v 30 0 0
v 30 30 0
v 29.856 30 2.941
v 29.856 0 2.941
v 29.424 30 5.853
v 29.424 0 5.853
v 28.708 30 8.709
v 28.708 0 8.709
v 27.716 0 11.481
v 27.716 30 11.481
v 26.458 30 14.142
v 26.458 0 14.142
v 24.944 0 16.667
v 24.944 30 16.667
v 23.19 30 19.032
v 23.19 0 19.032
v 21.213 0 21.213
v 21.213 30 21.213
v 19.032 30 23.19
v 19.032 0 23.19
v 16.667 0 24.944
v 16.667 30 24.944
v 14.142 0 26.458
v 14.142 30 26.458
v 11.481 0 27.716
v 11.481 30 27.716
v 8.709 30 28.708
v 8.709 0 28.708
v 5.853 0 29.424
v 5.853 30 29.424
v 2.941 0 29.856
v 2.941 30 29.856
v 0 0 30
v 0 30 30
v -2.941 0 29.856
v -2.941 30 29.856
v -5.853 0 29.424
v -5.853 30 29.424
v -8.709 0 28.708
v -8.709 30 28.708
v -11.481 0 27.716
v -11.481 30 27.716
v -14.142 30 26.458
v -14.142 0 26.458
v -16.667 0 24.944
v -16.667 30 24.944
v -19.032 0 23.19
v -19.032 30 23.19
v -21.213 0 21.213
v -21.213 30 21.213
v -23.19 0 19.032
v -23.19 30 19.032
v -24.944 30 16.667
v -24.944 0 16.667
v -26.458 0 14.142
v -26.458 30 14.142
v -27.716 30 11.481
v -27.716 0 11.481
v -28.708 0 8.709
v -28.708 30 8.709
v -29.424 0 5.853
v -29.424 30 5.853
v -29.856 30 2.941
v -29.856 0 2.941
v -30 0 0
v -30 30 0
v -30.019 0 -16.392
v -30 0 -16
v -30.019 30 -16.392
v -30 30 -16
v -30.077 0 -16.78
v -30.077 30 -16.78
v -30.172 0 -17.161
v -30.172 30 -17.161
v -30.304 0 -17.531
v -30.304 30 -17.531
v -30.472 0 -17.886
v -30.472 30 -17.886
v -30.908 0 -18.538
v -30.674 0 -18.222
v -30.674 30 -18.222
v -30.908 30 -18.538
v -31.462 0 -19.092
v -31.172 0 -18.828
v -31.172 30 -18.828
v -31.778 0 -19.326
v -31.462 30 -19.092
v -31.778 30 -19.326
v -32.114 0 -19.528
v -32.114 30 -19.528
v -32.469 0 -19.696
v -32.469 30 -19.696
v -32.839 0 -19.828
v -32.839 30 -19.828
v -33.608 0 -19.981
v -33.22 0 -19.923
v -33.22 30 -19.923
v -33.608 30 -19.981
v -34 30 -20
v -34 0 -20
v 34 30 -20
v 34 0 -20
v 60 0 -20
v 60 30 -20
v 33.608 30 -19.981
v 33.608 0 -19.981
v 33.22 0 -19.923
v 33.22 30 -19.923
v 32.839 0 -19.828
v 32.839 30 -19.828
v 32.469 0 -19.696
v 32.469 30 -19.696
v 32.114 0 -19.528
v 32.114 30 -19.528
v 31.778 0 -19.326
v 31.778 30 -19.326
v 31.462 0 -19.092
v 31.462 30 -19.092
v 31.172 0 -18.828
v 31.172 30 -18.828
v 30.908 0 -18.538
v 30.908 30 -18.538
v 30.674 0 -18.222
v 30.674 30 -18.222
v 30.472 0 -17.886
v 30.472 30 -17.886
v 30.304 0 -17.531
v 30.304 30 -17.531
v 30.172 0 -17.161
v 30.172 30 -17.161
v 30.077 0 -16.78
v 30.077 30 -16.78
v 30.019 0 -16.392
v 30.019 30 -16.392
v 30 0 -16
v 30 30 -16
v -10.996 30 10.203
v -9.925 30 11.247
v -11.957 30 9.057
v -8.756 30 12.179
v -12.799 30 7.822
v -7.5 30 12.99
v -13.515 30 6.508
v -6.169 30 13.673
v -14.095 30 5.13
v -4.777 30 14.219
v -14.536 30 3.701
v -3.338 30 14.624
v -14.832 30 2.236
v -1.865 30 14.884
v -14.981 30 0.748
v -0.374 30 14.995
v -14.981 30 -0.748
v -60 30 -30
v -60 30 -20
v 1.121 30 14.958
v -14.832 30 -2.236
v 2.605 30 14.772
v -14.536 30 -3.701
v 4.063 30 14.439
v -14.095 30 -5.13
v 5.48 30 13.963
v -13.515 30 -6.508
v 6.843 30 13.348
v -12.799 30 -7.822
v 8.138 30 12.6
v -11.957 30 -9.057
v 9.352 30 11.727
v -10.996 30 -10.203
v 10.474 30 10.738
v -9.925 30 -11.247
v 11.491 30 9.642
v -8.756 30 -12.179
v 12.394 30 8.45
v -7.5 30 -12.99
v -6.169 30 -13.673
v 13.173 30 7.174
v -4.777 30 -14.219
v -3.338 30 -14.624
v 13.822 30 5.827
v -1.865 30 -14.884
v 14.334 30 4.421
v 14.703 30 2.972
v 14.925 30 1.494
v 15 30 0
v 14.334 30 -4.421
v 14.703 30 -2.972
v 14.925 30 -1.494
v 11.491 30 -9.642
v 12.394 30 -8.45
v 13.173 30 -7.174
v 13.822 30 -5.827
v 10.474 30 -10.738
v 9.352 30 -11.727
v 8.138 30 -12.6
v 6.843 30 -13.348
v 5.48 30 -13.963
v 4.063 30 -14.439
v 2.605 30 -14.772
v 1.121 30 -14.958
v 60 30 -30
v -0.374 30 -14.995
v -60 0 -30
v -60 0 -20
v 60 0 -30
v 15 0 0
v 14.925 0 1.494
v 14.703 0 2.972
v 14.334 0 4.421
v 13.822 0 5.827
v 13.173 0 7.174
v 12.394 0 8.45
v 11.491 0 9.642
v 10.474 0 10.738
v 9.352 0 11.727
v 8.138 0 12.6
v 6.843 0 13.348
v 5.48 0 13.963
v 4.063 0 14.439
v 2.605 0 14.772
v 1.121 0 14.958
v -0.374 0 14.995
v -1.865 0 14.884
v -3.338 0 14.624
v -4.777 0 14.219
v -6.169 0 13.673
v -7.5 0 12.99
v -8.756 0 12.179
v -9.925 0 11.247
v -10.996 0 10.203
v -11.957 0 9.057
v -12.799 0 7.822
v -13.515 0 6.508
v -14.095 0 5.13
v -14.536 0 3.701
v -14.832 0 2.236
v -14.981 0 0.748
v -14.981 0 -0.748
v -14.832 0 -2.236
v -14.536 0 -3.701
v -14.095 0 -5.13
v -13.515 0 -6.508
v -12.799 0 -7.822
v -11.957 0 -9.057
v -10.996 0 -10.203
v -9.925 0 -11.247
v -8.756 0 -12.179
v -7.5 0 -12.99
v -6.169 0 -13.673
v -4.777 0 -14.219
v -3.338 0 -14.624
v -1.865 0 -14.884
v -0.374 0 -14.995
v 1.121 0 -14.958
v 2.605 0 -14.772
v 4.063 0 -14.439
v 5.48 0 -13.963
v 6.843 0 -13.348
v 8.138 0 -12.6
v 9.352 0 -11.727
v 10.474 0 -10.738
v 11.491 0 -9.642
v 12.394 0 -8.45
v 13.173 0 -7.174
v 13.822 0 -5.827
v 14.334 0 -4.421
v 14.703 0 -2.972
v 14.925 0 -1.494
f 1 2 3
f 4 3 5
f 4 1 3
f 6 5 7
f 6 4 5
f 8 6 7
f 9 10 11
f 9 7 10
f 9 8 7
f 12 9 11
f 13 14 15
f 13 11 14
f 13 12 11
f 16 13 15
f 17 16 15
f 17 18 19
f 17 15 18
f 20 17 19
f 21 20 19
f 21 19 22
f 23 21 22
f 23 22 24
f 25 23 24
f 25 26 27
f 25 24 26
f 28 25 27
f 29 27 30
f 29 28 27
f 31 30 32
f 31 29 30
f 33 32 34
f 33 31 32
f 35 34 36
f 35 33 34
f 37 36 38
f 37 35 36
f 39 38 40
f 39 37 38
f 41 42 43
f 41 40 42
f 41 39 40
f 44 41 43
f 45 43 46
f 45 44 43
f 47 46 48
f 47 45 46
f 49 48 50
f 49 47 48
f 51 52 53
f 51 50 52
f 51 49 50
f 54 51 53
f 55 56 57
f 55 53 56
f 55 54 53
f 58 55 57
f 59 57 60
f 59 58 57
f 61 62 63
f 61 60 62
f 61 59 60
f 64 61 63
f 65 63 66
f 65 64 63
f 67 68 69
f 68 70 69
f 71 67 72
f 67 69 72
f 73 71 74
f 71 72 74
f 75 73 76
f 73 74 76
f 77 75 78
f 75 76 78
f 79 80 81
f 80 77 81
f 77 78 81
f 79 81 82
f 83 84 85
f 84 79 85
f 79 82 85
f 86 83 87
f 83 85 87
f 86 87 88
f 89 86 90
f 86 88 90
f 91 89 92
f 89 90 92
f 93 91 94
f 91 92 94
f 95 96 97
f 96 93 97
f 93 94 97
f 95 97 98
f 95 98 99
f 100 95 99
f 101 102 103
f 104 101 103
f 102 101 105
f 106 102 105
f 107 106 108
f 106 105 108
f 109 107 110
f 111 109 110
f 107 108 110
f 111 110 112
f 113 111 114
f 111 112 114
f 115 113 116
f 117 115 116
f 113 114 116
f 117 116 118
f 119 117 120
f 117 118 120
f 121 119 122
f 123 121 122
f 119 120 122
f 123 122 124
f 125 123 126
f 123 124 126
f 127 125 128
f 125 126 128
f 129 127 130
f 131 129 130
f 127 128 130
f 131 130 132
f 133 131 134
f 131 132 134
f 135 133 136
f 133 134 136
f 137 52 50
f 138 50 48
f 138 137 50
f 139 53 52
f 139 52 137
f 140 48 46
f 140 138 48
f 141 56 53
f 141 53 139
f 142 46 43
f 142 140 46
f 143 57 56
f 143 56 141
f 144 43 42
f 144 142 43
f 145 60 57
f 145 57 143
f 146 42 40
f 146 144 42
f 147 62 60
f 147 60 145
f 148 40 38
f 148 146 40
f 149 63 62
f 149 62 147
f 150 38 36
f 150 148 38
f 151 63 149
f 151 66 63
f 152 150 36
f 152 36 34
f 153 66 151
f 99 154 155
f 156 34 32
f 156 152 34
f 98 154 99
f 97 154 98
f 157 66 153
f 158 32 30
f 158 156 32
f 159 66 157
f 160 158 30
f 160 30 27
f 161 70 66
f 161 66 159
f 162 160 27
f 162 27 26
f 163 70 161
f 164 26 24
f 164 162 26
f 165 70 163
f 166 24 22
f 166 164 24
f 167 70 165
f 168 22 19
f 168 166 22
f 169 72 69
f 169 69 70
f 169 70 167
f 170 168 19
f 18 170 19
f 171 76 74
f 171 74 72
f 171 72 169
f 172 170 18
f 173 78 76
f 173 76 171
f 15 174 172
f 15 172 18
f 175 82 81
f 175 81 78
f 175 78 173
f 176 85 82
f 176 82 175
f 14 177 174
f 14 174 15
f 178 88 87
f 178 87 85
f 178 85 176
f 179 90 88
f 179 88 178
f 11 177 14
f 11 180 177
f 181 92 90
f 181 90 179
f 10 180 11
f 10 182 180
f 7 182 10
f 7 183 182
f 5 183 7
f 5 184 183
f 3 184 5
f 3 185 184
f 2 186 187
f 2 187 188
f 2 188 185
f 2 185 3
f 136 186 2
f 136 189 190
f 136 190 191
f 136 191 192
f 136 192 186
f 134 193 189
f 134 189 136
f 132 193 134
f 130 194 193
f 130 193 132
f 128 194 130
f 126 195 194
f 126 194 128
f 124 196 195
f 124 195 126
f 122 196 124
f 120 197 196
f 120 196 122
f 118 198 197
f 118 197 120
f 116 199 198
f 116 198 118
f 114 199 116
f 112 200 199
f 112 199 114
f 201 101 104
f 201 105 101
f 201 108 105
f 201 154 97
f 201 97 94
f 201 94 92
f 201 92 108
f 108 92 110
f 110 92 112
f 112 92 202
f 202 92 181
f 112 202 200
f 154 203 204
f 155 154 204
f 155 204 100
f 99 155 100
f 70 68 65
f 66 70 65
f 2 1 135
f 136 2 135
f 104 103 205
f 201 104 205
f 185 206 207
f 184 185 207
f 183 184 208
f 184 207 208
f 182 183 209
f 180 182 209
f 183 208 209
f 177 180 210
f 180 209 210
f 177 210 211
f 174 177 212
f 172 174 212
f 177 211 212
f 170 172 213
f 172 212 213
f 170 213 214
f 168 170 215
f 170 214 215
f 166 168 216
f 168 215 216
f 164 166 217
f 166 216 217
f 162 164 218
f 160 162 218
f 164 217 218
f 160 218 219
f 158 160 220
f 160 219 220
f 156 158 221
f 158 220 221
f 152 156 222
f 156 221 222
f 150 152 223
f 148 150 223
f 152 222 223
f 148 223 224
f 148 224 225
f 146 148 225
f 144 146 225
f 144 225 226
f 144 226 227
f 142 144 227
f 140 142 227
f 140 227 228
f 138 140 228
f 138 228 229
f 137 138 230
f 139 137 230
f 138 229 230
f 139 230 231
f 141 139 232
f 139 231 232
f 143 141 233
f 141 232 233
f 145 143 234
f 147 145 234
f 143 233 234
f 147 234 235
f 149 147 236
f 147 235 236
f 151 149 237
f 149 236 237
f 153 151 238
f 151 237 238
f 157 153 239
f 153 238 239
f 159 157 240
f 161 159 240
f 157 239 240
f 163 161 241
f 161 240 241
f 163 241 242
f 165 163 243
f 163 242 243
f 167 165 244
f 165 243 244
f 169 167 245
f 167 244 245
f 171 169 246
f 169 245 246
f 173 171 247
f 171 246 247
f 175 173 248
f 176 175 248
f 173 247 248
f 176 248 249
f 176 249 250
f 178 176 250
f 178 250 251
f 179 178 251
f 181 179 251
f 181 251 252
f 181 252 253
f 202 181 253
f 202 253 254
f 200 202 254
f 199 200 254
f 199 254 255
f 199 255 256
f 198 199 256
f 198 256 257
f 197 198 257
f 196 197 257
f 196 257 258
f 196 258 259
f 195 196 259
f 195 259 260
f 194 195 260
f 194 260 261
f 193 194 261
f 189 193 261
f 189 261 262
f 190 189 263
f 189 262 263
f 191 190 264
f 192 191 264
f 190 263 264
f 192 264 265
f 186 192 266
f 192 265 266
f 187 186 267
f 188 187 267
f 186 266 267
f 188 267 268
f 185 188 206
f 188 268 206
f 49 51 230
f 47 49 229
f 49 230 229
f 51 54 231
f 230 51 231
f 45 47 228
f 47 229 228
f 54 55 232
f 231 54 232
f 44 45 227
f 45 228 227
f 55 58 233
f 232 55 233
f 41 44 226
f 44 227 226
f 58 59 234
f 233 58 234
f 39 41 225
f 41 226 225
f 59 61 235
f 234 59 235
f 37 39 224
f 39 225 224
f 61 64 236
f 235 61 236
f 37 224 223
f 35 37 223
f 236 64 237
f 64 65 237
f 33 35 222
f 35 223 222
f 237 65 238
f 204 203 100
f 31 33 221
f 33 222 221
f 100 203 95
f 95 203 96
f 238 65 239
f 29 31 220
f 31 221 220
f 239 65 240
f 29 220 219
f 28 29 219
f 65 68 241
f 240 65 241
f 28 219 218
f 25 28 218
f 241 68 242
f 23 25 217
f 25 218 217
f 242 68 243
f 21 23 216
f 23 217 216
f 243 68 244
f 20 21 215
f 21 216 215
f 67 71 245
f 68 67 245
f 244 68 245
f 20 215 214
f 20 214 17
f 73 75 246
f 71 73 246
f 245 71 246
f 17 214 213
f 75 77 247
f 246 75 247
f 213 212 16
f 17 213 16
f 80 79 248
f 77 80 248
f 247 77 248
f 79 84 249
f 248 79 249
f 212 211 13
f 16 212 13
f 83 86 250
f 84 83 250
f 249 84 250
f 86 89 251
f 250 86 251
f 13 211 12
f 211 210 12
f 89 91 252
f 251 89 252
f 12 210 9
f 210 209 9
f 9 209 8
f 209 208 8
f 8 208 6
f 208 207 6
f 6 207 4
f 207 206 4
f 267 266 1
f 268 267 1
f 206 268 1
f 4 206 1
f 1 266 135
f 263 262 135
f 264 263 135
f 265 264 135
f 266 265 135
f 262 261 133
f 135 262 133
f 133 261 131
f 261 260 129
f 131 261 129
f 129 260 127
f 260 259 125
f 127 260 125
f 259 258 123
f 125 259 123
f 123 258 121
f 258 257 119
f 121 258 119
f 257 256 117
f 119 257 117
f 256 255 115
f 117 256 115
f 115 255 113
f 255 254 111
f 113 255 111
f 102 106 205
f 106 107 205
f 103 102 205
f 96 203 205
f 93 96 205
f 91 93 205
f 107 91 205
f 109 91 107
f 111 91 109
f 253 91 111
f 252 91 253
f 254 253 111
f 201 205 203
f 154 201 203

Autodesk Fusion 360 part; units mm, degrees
sketch "Sketch1" plane through (0, 0, 0) normal (0, 1, 0) x (1, 0, 0)
  line L0 (-60.0453, 0.0038) -> (60.0453, 0.0038)
  line L1 (60.0453, 0.0038) -> (60.0453, -10.0038)
  line L2 (60.0453, -10.0038) -> (-60.0453, -10.0038)
  line L3 (-60.0453, -10.0038) -> (-60.0453, 0.0038)
  line L4 (-60.0453, 0.0038) -> (60.0453, -10.0038) construction
  line L5 (60.0453, 0.0038) -> (-60.0453, -10.0038) construction
  line L6 (-30, -10) -> (30, -10)
  line L7 (30, -10) -> (30, -30)
  line L8 (-30, -30) -> (-30, -10)
  line L9 (-30, -10) -> (30, -30) construction
  line L10 (30, -10) -> (-30, -30) construction
  arc A0 (-30, -30) -> (30, -30) centre (0, -30) ccw
  circle A1 centre (0, -30) radius 15
  line L11 (30, -30) -> (15, -30)
  line L12 (-15, -30) -> (-30, -30)
  point P0 (0, -5)
  point P1 (0, -20)
  dimension "d3" = 60
  dimension "d4" = 20
sketch "Sketch2" plane through (0, 0, 0) normal (0, 1, 0) x (1, 0, 0)
  line L0 (60, 30) -> (-60, 30)
  line L1 (-60, 30) -> (-60, 20)
  line L2 (-60, 20) -> (-30, 20)
  line L3 (-30, 20) -> (-30, 0)
  arc A0 (-30, 0) -> (30, 0) centre (0, 0) ccw
  line L4 (30, 0) -> (30, 20)
  line L5 (30, 20) -> (60, 20)
  line L6 (60, 20) -> (60, 30)
  dimension "d11" = 120
  dimension "d12" = 60
  dimension "d13" = 30
  dimension "d14" = 30
  dimension "d15" = 10
extrude "Extrude2" add sketch "Sketch2" along normal blind 30
sketch "Sketch3" plane through (0, 0, 0) normal (0, -1, 0) x (1, 0, 0)
  line L0 (60, -30) -> (60, -20)
  line L1 (60, -20) -> (30, -20)
  line L2 (30, -20) -> (30, 0)
  arc A0 (30, 0) -> (-30, 0) centre (0, 0) ccw
  line L3 (-30, 0) -> (-30, -20)
  line L4 (-30, -20) -> (-60, -20)
  line L5 (-60, -20) -> (-60, -30)
  line L6 (-60, -30) -> (60, -30)
  circle A1 centre (0, 0) radius 15
  dimension "d18" = 30
extrude "Extrude3" cut sketch "Sketch3" against normal blind 30 contours A1
fillet "Fillet5" radius 4 2 edges at (-30, 15, -20) (30, 15, -20)
